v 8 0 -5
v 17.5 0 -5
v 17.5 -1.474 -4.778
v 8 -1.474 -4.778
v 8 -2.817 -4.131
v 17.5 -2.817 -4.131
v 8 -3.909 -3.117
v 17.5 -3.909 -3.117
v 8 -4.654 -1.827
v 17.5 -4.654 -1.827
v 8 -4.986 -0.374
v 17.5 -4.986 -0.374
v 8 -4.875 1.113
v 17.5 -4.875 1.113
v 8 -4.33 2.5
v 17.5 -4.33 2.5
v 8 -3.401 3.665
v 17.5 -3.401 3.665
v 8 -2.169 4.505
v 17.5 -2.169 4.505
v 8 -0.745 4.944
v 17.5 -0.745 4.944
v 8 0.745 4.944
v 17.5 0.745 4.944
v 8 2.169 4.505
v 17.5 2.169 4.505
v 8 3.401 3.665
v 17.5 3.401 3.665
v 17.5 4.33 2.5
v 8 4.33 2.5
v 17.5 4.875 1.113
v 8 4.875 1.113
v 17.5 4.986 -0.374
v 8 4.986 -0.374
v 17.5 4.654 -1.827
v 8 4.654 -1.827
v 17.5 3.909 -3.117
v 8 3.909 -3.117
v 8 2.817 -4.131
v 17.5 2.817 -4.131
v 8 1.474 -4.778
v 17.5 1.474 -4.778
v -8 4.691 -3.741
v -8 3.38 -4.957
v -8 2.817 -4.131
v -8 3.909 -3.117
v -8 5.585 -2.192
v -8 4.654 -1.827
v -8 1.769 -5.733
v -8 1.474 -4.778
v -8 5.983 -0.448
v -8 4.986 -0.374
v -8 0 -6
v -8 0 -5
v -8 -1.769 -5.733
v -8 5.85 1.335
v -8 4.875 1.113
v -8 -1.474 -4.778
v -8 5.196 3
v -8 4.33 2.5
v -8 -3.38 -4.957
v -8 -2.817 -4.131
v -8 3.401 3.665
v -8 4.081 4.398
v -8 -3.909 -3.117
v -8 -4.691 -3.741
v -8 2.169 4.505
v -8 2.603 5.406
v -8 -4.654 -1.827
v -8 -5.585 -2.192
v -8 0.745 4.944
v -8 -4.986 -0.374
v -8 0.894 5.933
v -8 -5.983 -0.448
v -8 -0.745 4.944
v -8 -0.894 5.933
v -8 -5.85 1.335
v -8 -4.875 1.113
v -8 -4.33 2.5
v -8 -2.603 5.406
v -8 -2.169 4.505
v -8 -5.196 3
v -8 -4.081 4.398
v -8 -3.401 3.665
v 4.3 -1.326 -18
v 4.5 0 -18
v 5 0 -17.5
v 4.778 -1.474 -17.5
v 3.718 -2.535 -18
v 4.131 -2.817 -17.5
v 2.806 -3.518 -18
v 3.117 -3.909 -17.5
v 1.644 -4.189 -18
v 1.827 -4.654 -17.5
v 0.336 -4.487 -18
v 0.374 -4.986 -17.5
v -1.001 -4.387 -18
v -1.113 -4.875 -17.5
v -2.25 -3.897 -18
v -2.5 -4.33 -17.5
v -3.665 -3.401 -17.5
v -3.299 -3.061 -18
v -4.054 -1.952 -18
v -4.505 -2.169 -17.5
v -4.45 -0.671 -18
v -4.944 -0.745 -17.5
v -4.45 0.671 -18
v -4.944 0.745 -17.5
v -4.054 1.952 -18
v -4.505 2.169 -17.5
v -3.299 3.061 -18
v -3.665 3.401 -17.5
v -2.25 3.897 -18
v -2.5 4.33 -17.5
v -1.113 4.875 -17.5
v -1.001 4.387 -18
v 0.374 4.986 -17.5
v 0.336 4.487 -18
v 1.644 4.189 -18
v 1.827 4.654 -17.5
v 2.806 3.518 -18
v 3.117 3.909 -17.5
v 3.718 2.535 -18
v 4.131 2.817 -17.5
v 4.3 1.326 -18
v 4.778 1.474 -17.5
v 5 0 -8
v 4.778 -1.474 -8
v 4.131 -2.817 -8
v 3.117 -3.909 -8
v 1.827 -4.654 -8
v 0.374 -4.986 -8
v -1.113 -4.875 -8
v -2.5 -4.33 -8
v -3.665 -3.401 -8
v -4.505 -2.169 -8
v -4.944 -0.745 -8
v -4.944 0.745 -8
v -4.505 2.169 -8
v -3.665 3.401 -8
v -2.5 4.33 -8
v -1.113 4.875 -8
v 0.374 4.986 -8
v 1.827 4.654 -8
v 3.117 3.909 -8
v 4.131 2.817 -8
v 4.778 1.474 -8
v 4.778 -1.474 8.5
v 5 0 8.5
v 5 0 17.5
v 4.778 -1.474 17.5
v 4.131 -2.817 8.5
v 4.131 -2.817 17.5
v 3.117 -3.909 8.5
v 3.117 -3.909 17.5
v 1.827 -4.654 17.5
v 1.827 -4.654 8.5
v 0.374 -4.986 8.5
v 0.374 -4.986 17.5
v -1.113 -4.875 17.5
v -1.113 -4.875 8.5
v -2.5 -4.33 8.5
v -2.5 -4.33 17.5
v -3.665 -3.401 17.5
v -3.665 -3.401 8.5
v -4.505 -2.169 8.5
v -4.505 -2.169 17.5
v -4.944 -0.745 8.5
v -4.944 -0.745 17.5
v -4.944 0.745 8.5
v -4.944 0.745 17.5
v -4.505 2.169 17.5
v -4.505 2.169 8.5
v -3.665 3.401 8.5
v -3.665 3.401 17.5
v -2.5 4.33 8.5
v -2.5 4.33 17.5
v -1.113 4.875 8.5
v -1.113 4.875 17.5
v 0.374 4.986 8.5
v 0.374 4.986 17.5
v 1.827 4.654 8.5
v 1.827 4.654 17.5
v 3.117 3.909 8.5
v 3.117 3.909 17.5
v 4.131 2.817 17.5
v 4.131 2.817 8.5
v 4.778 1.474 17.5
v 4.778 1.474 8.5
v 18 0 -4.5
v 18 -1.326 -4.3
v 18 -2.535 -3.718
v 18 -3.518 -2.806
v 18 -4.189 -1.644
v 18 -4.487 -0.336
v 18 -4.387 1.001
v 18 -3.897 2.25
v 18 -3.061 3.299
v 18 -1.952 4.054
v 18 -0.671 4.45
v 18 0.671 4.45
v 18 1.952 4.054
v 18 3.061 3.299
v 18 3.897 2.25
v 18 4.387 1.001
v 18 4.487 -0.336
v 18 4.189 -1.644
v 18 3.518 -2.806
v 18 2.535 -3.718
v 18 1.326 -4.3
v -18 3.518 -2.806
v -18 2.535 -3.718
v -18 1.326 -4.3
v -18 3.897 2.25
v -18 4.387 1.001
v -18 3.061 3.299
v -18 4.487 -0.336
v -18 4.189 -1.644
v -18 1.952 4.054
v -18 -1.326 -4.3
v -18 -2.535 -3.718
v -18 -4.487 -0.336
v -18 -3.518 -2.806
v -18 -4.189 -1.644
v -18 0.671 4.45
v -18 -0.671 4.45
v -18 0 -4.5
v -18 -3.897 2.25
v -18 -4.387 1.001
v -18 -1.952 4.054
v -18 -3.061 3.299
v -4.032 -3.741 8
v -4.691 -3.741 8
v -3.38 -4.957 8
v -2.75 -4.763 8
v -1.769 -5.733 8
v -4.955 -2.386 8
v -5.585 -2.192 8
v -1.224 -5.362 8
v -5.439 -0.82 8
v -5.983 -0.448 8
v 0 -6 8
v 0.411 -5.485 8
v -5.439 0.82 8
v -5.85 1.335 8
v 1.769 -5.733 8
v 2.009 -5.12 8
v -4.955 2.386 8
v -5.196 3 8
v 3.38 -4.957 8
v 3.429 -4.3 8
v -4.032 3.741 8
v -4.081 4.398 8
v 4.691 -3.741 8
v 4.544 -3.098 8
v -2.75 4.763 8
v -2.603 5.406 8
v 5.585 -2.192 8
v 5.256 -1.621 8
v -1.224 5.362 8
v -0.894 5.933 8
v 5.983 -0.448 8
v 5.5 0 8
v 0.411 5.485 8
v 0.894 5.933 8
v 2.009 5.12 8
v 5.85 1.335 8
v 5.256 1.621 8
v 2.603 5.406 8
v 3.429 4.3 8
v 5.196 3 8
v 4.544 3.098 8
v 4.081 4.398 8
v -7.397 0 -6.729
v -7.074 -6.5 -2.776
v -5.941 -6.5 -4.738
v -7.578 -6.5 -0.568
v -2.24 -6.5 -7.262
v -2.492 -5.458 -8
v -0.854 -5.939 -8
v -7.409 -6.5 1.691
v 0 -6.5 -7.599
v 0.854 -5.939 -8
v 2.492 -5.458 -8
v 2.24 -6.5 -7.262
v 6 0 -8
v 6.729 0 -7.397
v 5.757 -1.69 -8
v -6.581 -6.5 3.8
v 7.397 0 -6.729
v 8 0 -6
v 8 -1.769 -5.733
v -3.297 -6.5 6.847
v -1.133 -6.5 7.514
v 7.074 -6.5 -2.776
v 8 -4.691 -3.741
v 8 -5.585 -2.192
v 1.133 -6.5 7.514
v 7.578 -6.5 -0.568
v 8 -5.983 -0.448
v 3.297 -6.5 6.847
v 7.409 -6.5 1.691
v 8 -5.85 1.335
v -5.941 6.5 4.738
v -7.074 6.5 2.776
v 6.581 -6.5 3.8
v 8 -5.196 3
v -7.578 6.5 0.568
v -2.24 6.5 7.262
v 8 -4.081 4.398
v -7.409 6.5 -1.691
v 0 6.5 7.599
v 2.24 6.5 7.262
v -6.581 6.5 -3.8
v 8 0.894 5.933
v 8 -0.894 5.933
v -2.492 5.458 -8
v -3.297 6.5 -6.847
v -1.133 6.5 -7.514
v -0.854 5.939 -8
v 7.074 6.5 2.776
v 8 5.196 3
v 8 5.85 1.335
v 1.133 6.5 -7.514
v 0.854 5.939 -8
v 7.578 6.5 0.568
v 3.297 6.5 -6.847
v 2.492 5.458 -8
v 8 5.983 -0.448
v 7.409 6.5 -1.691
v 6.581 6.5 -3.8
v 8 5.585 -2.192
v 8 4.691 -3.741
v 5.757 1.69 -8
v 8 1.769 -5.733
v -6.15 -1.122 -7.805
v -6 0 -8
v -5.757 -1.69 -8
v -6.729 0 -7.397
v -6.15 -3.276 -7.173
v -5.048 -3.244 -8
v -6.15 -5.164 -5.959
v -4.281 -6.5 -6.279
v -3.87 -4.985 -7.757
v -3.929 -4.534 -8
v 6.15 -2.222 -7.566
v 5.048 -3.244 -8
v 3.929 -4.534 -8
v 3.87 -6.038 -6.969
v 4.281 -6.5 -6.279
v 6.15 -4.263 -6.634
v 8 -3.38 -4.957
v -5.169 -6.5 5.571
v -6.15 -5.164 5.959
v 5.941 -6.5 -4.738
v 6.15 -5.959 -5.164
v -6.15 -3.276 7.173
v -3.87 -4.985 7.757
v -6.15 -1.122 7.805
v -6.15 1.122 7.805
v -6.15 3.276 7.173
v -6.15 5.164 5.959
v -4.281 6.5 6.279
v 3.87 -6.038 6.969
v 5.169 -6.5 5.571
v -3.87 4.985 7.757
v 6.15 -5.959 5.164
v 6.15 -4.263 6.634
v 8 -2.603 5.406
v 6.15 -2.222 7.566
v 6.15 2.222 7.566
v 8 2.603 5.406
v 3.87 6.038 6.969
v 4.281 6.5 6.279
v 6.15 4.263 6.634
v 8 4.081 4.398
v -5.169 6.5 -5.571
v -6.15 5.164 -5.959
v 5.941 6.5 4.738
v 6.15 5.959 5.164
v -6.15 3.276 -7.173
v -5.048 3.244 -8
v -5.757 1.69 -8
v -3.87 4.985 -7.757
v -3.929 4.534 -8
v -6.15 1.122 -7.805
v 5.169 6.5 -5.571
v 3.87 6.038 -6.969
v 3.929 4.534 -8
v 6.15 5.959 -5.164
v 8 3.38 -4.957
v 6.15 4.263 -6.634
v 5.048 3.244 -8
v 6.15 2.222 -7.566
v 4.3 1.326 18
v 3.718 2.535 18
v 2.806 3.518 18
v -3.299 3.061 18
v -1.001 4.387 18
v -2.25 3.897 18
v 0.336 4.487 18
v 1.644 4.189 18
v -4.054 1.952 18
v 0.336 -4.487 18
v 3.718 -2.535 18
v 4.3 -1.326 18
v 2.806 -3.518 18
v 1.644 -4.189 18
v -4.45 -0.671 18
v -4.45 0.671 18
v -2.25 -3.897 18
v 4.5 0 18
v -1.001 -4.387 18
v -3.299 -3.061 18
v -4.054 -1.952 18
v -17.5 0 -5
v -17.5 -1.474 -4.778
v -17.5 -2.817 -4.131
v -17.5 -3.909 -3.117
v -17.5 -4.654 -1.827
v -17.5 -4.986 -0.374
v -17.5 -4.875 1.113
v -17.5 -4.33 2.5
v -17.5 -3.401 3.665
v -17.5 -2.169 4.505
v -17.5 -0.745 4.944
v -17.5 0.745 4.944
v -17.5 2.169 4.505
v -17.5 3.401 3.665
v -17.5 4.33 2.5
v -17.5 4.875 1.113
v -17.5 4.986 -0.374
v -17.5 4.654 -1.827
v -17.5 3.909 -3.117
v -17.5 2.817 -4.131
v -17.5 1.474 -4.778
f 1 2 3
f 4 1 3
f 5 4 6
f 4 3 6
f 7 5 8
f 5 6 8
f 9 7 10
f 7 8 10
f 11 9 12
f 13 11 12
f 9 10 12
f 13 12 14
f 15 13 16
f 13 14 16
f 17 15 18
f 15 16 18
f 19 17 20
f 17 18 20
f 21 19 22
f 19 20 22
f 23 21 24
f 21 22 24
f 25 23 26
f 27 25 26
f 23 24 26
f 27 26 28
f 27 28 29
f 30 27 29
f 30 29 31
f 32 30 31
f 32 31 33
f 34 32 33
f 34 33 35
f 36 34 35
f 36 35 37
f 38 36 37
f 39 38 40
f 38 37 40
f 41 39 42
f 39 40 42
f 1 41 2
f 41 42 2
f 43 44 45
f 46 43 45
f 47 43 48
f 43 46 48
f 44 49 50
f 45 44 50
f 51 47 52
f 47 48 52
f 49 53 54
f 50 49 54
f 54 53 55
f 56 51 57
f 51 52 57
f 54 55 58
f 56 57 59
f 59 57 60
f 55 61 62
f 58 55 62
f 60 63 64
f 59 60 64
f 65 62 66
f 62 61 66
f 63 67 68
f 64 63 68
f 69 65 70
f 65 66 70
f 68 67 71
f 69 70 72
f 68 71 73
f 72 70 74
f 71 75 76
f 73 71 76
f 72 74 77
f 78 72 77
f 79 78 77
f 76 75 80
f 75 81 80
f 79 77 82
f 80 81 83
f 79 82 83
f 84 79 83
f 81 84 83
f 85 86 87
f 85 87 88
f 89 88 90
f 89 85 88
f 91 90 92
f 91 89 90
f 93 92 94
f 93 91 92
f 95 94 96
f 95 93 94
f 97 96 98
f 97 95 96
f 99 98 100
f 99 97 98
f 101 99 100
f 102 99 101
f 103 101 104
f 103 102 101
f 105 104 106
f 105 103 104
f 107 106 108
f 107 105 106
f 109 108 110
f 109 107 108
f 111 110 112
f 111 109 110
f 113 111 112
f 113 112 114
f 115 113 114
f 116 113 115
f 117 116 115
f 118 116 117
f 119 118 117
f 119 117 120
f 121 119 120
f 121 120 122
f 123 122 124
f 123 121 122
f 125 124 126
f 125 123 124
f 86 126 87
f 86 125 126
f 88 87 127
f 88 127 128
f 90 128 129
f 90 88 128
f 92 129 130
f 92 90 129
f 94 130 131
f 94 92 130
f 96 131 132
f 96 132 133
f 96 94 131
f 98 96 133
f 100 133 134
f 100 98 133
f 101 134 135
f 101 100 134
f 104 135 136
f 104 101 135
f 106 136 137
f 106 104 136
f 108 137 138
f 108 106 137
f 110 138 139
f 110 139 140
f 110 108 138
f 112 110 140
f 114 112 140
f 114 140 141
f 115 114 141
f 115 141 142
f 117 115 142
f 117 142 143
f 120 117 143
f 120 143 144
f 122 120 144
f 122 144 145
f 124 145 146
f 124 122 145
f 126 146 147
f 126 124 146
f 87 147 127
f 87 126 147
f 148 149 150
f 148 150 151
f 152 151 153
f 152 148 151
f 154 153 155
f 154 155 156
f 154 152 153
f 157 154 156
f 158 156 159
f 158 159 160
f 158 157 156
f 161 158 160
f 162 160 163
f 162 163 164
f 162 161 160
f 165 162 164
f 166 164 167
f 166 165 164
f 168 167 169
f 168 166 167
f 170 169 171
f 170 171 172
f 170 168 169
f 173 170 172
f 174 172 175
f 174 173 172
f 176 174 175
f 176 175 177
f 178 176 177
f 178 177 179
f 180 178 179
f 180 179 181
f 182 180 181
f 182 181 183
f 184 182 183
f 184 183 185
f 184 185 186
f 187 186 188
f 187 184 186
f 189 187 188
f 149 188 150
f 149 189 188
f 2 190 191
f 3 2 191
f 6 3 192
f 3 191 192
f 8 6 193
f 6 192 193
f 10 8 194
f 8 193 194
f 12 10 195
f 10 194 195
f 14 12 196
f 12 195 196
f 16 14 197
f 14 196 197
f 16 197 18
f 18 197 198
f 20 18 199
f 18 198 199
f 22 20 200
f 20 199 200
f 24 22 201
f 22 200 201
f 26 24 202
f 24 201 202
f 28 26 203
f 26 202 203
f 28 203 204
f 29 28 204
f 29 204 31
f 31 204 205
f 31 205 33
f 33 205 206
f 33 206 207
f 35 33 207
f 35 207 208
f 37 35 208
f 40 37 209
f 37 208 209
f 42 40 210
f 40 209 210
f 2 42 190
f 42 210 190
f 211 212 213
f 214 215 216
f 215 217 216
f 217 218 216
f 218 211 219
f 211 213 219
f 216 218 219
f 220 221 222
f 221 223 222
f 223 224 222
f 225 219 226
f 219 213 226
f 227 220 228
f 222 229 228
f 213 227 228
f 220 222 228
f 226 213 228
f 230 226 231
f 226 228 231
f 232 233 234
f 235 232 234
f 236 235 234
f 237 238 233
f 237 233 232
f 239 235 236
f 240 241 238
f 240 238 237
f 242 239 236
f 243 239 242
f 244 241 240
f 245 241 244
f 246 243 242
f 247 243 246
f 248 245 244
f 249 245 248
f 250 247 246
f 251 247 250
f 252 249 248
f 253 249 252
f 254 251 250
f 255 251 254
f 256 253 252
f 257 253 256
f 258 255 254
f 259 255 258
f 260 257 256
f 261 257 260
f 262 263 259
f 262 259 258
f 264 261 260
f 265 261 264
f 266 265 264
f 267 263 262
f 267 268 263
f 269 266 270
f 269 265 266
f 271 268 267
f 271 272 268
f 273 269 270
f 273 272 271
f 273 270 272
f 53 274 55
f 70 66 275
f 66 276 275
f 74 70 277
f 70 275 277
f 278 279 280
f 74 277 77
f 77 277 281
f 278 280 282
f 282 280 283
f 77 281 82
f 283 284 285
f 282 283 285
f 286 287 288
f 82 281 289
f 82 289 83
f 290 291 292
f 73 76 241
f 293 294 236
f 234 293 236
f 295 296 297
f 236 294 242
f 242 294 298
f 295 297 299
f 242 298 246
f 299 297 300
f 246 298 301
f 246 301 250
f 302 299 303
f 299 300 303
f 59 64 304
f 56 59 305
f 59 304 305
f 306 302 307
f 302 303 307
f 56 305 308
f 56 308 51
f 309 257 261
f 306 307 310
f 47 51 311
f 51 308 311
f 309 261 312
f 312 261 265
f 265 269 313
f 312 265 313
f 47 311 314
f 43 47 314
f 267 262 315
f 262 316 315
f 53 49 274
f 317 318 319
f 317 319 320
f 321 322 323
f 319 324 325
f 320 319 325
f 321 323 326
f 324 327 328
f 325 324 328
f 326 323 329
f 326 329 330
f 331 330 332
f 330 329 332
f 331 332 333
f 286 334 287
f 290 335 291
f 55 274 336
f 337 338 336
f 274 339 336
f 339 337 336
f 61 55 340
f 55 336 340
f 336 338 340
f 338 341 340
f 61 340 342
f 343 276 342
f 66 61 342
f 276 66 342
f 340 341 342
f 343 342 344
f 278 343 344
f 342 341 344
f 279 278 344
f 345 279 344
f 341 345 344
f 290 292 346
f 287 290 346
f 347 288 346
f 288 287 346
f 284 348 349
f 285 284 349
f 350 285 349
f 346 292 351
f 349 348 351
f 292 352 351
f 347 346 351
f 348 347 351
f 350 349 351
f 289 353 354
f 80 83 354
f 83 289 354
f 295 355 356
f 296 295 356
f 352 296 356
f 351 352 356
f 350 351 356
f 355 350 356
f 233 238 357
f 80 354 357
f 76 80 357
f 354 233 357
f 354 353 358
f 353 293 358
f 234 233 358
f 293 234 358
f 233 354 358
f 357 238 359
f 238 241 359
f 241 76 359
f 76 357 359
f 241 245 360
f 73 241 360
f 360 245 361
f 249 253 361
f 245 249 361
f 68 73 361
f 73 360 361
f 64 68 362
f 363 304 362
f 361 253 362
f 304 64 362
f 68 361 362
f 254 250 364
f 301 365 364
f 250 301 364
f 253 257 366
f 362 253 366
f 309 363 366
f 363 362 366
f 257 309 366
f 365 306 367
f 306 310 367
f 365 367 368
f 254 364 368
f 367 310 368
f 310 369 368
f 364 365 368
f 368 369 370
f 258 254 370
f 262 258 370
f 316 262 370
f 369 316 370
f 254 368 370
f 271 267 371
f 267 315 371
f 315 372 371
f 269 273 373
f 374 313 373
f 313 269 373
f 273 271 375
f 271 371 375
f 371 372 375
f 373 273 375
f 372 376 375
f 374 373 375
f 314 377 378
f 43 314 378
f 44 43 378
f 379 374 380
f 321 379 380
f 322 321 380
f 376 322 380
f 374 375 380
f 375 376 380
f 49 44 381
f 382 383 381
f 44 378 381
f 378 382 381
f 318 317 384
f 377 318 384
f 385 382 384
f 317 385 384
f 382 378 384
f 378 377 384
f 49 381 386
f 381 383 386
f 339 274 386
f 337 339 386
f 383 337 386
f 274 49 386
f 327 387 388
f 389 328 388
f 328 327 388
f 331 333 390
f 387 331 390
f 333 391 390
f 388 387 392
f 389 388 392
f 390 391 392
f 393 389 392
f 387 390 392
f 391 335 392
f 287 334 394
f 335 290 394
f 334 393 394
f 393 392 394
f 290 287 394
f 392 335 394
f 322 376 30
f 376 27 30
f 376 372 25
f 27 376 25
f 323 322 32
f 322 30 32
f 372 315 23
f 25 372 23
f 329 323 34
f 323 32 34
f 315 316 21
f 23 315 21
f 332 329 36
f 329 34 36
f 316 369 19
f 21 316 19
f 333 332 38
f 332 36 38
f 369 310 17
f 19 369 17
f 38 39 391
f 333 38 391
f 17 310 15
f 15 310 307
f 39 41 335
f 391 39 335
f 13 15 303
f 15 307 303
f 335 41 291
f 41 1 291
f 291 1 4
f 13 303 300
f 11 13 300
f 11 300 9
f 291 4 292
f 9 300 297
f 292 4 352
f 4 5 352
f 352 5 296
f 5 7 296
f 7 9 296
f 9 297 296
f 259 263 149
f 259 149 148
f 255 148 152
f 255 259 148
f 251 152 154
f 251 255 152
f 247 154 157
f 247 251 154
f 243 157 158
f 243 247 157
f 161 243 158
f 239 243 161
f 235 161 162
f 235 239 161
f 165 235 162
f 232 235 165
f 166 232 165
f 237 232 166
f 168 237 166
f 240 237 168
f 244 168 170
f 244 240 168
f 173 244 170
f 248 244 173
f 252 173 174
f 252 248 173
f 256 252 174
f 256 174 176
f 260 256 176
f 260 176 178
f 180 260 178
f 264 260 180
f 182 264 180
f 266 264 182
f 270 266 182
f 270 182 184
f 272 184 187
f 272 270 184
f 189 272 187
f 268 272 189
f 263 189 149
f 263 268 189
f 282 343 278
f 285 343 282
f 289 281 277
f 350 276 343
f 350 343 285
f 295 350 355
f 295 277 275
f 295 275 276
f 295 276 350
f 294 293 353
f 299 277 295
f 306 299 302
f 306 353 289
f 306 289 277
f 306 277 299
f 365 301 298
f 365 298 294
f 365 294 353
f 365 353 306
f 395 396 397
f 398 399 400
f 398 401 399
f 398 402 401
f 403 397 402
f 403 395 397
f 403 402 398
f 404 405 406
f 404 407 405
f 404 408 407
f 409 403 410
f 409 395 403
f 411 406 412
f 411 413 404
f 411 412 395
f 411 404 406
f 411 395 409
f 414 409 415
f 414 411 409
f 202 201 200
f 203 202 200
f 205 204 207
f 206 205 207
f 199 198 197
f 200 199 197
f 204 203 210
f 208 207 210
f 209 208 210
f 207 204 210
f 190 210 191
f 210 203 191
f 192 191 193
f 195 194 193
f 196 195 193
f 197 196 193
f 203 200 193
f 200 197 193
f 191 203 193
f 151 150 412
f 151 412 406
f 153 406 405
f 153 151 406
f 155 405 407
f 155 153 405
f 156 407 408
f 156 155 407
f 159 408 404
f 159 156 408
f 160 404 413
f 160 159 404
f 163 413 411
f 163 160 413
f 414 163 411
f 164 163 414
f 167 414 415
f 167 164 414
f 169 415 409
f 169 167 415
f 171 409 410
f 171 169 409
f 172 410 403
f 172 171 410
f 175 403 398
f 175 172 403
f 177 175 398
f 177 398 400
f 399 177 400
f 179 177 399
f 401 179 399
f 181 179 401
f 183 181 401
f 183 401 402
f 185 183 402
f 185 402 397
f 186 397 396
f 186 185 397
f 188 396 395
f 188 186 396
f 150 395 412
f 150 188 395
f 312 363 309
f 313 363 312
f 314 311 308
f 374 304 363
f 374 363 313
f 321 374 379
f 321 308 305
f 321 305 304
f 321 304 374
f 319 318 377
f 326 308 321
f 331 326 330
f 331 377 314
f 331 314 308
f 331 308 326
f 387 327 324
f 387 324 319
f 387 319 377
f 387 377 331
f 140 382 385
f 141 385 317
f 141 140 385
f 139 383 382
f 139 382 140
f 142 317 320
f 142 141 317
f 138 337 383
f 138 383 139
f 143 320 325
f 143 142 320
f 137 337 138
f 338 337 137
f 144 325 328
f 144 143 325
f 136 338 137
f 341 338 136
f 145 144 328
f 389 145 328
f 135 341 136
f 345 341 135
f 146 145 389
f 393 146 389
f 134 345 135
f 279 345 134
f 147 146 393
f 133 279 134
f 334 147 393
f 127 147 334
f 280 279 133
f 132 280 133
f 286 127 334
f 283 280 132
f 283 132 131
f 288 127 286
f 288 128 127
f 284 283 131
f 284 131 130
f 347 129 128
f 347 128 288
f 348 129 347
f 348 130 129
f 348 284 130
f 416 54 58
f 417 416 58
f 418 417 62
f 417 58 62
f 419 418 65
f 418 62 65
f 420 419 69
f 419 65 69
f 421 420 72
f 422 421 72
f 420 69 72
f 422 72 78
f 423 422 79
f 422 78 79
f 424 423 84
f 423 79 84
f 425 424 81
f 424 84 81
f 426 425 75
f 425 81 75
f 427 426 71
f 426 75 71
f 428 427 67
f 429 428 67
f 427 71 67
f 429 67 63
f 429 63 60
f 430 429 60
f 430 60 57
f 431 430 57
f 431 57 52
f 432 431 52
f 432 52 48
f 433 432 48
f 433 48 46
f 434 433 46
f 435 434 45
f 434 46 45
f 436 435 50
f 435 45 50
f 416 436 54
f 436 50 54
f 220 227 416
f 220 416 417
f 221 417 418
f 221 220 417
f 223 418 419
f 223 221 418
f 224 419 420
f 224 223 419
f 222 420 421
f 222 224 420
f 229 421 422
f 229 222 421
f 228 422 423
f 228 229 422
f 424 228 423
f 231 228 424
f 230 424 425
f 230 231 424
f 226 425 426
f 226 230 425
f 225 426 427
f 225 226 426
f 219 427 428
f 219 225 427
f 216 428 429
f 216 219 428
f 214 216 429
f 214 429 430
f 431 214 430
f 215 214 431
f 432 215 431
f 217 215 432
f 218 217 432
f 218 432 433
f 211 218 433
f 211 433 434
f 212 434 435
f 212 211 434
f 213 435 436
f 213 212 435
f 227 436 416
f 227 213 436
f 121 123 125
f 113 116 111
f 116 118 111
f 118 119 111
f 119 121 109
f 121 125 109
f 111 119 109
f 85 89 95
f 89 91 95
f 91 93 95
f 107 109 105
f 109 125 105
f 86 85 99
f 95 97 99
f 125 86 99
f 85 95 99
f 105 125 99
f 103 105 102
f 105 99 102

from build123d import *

# Parameters (mm, degrees)
ESQUISSE2_W             = 18
ESQUISSE2_H             = 4.5
ENL_V_MAT_EXTRU_1_DEPTH = 12.5
ESQUISSE3_W             = 18
ESQUISSE3_H             = 3
ENL_V_MAT_EXTRU_2_DEPTH = 12.5
ESQUISSE4_W             = 5
ESQUISSE4_H             = 36
CHANFREIN1_SIZE         = 0.5


with BuildPart() as part:
    # Esquisse1 → Base-Révolution (revolve)
    with BuildSketch(Plane.XY, mode=Mode.PRIVATE) as base_r_volution_sk:
        with BuildLine():
            Line((18, 0), (-18, 0))
            Line((-18, 0), (-18, 5))
            Line((-18, 5), (-8, 5))
            Line((-8, 5), (-8, 6))
            ThreePointArc((-8, 6), (0, 10), (8, 6))
            Line((8, 6), (8, 5))
            Line((8, 5), (18, 5))
            Line((18, 5), (18, 0))
        make_face()
    revolve(base_r_volution_sk.sketch.rotate(Axis((0, 0, 0), (-1, 0, 0)), 90), axis=Axis((0, 0, 0), (-1, 0, 0)))

    # Esquisse2 → Enlèv. mat.-Extru.1 (cut, symmetric)
    with BuildSketch(Plane.XY):
        with Locations((0, 8.75)):
            Rectangle(ESQUISSE2_W, ESQUISSE2_H)
        with Locations((0, -8.75)):
            Rectangle(ESQUISSE2_W, ESQUISSE2_H)
    extrude(amount=ENL_V_MAT_EXTRU_1_DEPTH, both=True, mode=Mode.SUBTRACT)

    # Esquisse3 → Enlèv. mat.-Extru.2 (cut, symmetric)
    with BuildSketch(Plane(origin=(0, 0, 0), x_dir=(1, 0, 0), z_dir=(0, 1, 0))):
        with Locations((0, 9.5)):
            Rectangle(ESQUISSE3_W, ESQUISSE3_H)
        with Locations((0, -9.5)):
            Rectangle(ESQUISSE3_W, ESQUISSE3_H)
    extrude(amount=ENL_V_MAT_EXTRU_2_DEPTH, both=True, mode=Mode.SUBTRACT)

    # Esquisse4 → Boss.-Révol.1 (revolve)
    with BuildSketch(Plane(origin=(0, 0, 0), x_dir=(1, 0, 0), z_dir=(0, 1, 0))):
        with Locations((2.5, 0)):
            Rectangle(ESQUISSE4_W, ESQUISSE4_H)
    revolve(axis=Axis((0, 0, 0), (0, 0, -1)))

    # Chanfrein1
    chanfrein1_edges = [part.edges().sort_by_distance(p)[0] for p in [
        (-18, 0, 5),
        (-5, 0, 8),
        (-5, 0, -18),
        (18, 0, 5),
        (-5, 0, 18),
    ]]
    chamfer(chanfrein1_edges, length=CHANFREIN1_SIZE)


solid = part.part
